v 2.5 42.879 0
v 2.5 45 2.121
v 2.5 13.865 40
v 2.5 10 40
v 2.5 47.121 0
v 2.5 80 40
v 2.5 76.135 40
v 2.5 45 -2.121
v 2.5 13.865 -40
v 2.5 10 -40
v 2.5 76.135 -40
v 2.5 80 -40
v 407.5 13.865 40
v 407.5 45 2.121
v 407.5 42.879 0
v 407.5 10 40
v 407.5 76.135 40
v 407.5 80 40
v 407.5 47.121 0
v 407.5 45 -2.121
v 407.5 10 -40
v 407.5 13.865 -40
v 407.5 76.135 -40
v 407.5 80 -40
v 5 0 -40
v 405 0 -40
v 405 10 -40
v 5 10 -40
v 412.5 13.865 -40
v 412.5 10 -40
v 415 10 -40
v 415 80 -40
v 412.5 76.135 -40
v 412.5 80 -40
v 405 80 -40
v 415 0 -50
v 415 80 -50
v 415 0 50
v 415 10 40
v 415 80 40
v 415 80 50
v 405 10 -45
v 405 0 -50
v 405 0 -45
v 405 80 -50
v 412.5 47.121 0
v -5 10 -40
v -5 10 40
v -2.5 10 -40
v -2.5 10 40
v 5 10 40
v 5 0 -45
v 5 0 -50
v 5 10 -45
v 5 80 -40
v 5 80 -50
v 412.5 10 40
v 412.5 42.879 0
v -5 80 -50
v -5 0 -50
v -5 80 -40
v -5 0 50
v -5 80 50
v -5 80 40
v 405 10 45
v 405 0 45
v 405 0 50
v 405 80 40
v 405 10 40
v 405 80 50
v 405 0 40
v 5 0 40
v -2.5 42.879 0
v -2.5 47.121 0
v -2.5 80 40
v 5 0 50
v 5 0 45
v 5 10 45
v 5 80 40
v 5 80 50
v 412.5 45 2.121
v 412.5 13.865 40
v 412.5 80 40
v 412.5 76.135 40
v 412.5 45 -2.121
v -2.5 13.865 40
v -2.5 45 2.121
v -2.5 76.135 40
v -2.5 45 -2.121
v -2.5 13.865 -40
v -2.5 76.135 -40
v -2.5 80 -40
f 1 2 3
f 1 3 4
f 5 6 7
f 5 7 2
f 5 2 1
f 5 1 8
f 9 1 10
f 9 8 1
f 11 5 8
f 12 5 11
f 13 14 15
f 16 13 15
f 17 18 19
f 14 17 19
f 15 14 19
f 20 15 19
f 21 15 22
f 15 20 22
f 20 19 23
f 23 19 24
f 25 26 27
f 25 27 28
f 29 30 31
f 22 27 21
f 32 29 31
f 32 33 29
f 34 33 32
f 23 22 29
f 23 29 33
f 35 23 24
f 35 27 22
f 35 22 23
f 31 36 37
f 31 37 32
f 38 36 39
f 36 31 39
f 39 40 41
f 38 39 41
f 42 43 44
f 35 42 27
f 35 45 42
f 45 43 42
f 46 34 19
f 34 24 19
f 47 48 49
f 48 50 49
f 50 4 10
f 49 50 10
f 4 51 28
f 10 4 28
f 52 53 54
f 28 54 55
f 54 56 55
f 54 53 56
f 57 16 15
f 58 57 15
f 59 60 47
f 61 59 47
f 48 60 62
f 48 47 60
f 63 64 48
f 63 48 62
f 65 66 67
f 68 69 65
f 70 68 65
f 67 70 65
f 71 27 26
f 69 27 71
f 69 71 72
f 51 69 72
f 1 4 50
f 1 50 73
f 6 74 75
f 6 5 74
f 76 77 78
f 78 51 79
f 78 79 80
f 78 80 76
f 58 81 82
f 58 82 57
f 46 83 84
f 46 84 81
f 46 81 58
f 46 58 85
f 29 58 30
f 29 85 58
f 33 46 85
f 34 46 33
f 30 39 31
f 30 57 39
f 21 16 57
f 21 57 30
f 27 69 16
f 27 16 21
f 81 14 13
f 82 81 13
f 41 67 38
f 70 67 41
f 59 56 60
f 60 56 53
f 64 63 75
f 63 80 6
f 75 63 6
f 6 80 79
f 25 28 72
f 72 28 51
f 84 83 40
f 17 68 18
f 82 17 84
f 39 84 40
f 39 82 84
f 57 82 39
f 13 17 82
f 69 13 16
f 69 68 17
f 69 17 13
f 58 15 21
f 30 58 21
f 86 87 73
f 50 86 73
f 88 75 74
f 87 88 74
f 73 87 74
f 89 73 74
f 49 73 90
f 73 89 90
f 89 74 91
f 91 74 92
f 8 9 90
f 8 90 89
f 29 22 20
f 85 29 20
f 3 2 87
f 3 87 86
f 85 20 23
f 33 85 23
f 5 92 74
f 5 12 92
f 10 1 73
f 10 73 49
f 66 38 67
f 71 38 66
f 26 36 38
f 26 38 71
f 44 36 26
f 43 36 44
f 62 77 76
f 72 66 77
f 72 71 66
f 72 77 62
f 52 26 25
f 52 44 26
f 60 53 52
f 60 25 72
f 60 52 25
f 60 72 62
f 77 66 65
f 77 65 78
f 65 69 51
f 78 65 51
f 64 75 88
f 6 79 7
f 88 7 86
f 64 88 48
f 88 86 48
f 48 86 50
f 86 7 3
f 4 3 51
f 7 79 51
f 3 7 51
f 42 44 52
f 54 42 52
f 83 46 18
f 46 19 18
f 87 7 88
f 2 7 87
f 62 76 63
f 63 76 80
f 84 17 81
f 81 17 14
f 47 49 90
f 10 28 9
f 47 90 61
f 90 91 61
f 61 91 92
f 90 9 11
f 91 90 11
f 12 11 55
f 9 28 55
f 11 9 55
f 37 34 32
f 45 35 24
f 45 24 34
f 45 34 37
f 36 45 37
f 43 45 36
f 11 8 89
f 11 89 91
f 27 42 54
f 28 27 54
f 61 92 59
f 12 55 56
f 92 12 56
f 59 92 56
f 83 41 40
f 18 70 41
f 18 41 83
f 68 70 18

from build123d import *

# Parameters (mm, degrees)
BOSS_EXTRUDE1_DEPTH = 5
BOSS_EXTRUDE2_DEPTH = 2.5
SKETCH2_W           = 200
SKETCH2_H           = 5
BOSS_EXTRUDE3_DEPTH = 10


with BuildPart() as part:
    # Sketch1 → Boss-Extrude1 (new, symmetric)
    with BuildSketch(Plane(origin=(0, 0, 0), x_dir=(0, 0, -1), z_dir=(1, 0, 0))):
        Polygon((-50, 80), (-50, 0), (50, 0), (50, 80), (40, 80), (40, 76.135024964), (40, 13.864975036), (40, 10), (-40, 10), (-40, 13.864975036), (-40, 76.135024964), (-40, 80), align=None)
    extrude(amount=BOSS_EXTRUDE1_DEPTH, both=True)

    # Sketch1<4> → Boss-Extrude2 (add, symmetric)
    with BuildSketch(Plane(origin=(0, 0, 0), x_dir=(0, 0, -1), z_dir=(1, 0, 0))):
        Polygon((0, 47.12132), (-40, 80), (-40, 76.135024964), (-2.12132, 45), (-40, 13.864975036), (-40, 10), (0, 42.87868), (40, 10), (40, 13.864975036), (2.12132, 45), (40, 76.135024964), (40, 80), align=None)
    extrude(amount=BOSS_EXTRUDE2_DEPTH, both=True)

    # Sketch2 → Boss-Extrude3 (add)
    with BuildSketch(Plane(origin=(0, 0, 0), x_dir=(1, 0, 0), z_dir=(0, 1, 0))):
        with Locations((105, 42.5)):
            Rectangle(SKETCH2_W, SKETCH2_H)
        with Locations((105, -42.5)):
            Rectangle(SKETCH2_W, SKETCH2_H)
    extrude(amount=BOSS_EXTRUDE3_DEPTH)

    # Mirror1: part across plane


with BuildPart() as part_1:
    add(part.part)
    add(part.part.mirror(Plane(origin=(205, 10, 40), x_dir=(0, 0, 1), z_dir=(-1, 0, 0))))


solid = part_1.part
